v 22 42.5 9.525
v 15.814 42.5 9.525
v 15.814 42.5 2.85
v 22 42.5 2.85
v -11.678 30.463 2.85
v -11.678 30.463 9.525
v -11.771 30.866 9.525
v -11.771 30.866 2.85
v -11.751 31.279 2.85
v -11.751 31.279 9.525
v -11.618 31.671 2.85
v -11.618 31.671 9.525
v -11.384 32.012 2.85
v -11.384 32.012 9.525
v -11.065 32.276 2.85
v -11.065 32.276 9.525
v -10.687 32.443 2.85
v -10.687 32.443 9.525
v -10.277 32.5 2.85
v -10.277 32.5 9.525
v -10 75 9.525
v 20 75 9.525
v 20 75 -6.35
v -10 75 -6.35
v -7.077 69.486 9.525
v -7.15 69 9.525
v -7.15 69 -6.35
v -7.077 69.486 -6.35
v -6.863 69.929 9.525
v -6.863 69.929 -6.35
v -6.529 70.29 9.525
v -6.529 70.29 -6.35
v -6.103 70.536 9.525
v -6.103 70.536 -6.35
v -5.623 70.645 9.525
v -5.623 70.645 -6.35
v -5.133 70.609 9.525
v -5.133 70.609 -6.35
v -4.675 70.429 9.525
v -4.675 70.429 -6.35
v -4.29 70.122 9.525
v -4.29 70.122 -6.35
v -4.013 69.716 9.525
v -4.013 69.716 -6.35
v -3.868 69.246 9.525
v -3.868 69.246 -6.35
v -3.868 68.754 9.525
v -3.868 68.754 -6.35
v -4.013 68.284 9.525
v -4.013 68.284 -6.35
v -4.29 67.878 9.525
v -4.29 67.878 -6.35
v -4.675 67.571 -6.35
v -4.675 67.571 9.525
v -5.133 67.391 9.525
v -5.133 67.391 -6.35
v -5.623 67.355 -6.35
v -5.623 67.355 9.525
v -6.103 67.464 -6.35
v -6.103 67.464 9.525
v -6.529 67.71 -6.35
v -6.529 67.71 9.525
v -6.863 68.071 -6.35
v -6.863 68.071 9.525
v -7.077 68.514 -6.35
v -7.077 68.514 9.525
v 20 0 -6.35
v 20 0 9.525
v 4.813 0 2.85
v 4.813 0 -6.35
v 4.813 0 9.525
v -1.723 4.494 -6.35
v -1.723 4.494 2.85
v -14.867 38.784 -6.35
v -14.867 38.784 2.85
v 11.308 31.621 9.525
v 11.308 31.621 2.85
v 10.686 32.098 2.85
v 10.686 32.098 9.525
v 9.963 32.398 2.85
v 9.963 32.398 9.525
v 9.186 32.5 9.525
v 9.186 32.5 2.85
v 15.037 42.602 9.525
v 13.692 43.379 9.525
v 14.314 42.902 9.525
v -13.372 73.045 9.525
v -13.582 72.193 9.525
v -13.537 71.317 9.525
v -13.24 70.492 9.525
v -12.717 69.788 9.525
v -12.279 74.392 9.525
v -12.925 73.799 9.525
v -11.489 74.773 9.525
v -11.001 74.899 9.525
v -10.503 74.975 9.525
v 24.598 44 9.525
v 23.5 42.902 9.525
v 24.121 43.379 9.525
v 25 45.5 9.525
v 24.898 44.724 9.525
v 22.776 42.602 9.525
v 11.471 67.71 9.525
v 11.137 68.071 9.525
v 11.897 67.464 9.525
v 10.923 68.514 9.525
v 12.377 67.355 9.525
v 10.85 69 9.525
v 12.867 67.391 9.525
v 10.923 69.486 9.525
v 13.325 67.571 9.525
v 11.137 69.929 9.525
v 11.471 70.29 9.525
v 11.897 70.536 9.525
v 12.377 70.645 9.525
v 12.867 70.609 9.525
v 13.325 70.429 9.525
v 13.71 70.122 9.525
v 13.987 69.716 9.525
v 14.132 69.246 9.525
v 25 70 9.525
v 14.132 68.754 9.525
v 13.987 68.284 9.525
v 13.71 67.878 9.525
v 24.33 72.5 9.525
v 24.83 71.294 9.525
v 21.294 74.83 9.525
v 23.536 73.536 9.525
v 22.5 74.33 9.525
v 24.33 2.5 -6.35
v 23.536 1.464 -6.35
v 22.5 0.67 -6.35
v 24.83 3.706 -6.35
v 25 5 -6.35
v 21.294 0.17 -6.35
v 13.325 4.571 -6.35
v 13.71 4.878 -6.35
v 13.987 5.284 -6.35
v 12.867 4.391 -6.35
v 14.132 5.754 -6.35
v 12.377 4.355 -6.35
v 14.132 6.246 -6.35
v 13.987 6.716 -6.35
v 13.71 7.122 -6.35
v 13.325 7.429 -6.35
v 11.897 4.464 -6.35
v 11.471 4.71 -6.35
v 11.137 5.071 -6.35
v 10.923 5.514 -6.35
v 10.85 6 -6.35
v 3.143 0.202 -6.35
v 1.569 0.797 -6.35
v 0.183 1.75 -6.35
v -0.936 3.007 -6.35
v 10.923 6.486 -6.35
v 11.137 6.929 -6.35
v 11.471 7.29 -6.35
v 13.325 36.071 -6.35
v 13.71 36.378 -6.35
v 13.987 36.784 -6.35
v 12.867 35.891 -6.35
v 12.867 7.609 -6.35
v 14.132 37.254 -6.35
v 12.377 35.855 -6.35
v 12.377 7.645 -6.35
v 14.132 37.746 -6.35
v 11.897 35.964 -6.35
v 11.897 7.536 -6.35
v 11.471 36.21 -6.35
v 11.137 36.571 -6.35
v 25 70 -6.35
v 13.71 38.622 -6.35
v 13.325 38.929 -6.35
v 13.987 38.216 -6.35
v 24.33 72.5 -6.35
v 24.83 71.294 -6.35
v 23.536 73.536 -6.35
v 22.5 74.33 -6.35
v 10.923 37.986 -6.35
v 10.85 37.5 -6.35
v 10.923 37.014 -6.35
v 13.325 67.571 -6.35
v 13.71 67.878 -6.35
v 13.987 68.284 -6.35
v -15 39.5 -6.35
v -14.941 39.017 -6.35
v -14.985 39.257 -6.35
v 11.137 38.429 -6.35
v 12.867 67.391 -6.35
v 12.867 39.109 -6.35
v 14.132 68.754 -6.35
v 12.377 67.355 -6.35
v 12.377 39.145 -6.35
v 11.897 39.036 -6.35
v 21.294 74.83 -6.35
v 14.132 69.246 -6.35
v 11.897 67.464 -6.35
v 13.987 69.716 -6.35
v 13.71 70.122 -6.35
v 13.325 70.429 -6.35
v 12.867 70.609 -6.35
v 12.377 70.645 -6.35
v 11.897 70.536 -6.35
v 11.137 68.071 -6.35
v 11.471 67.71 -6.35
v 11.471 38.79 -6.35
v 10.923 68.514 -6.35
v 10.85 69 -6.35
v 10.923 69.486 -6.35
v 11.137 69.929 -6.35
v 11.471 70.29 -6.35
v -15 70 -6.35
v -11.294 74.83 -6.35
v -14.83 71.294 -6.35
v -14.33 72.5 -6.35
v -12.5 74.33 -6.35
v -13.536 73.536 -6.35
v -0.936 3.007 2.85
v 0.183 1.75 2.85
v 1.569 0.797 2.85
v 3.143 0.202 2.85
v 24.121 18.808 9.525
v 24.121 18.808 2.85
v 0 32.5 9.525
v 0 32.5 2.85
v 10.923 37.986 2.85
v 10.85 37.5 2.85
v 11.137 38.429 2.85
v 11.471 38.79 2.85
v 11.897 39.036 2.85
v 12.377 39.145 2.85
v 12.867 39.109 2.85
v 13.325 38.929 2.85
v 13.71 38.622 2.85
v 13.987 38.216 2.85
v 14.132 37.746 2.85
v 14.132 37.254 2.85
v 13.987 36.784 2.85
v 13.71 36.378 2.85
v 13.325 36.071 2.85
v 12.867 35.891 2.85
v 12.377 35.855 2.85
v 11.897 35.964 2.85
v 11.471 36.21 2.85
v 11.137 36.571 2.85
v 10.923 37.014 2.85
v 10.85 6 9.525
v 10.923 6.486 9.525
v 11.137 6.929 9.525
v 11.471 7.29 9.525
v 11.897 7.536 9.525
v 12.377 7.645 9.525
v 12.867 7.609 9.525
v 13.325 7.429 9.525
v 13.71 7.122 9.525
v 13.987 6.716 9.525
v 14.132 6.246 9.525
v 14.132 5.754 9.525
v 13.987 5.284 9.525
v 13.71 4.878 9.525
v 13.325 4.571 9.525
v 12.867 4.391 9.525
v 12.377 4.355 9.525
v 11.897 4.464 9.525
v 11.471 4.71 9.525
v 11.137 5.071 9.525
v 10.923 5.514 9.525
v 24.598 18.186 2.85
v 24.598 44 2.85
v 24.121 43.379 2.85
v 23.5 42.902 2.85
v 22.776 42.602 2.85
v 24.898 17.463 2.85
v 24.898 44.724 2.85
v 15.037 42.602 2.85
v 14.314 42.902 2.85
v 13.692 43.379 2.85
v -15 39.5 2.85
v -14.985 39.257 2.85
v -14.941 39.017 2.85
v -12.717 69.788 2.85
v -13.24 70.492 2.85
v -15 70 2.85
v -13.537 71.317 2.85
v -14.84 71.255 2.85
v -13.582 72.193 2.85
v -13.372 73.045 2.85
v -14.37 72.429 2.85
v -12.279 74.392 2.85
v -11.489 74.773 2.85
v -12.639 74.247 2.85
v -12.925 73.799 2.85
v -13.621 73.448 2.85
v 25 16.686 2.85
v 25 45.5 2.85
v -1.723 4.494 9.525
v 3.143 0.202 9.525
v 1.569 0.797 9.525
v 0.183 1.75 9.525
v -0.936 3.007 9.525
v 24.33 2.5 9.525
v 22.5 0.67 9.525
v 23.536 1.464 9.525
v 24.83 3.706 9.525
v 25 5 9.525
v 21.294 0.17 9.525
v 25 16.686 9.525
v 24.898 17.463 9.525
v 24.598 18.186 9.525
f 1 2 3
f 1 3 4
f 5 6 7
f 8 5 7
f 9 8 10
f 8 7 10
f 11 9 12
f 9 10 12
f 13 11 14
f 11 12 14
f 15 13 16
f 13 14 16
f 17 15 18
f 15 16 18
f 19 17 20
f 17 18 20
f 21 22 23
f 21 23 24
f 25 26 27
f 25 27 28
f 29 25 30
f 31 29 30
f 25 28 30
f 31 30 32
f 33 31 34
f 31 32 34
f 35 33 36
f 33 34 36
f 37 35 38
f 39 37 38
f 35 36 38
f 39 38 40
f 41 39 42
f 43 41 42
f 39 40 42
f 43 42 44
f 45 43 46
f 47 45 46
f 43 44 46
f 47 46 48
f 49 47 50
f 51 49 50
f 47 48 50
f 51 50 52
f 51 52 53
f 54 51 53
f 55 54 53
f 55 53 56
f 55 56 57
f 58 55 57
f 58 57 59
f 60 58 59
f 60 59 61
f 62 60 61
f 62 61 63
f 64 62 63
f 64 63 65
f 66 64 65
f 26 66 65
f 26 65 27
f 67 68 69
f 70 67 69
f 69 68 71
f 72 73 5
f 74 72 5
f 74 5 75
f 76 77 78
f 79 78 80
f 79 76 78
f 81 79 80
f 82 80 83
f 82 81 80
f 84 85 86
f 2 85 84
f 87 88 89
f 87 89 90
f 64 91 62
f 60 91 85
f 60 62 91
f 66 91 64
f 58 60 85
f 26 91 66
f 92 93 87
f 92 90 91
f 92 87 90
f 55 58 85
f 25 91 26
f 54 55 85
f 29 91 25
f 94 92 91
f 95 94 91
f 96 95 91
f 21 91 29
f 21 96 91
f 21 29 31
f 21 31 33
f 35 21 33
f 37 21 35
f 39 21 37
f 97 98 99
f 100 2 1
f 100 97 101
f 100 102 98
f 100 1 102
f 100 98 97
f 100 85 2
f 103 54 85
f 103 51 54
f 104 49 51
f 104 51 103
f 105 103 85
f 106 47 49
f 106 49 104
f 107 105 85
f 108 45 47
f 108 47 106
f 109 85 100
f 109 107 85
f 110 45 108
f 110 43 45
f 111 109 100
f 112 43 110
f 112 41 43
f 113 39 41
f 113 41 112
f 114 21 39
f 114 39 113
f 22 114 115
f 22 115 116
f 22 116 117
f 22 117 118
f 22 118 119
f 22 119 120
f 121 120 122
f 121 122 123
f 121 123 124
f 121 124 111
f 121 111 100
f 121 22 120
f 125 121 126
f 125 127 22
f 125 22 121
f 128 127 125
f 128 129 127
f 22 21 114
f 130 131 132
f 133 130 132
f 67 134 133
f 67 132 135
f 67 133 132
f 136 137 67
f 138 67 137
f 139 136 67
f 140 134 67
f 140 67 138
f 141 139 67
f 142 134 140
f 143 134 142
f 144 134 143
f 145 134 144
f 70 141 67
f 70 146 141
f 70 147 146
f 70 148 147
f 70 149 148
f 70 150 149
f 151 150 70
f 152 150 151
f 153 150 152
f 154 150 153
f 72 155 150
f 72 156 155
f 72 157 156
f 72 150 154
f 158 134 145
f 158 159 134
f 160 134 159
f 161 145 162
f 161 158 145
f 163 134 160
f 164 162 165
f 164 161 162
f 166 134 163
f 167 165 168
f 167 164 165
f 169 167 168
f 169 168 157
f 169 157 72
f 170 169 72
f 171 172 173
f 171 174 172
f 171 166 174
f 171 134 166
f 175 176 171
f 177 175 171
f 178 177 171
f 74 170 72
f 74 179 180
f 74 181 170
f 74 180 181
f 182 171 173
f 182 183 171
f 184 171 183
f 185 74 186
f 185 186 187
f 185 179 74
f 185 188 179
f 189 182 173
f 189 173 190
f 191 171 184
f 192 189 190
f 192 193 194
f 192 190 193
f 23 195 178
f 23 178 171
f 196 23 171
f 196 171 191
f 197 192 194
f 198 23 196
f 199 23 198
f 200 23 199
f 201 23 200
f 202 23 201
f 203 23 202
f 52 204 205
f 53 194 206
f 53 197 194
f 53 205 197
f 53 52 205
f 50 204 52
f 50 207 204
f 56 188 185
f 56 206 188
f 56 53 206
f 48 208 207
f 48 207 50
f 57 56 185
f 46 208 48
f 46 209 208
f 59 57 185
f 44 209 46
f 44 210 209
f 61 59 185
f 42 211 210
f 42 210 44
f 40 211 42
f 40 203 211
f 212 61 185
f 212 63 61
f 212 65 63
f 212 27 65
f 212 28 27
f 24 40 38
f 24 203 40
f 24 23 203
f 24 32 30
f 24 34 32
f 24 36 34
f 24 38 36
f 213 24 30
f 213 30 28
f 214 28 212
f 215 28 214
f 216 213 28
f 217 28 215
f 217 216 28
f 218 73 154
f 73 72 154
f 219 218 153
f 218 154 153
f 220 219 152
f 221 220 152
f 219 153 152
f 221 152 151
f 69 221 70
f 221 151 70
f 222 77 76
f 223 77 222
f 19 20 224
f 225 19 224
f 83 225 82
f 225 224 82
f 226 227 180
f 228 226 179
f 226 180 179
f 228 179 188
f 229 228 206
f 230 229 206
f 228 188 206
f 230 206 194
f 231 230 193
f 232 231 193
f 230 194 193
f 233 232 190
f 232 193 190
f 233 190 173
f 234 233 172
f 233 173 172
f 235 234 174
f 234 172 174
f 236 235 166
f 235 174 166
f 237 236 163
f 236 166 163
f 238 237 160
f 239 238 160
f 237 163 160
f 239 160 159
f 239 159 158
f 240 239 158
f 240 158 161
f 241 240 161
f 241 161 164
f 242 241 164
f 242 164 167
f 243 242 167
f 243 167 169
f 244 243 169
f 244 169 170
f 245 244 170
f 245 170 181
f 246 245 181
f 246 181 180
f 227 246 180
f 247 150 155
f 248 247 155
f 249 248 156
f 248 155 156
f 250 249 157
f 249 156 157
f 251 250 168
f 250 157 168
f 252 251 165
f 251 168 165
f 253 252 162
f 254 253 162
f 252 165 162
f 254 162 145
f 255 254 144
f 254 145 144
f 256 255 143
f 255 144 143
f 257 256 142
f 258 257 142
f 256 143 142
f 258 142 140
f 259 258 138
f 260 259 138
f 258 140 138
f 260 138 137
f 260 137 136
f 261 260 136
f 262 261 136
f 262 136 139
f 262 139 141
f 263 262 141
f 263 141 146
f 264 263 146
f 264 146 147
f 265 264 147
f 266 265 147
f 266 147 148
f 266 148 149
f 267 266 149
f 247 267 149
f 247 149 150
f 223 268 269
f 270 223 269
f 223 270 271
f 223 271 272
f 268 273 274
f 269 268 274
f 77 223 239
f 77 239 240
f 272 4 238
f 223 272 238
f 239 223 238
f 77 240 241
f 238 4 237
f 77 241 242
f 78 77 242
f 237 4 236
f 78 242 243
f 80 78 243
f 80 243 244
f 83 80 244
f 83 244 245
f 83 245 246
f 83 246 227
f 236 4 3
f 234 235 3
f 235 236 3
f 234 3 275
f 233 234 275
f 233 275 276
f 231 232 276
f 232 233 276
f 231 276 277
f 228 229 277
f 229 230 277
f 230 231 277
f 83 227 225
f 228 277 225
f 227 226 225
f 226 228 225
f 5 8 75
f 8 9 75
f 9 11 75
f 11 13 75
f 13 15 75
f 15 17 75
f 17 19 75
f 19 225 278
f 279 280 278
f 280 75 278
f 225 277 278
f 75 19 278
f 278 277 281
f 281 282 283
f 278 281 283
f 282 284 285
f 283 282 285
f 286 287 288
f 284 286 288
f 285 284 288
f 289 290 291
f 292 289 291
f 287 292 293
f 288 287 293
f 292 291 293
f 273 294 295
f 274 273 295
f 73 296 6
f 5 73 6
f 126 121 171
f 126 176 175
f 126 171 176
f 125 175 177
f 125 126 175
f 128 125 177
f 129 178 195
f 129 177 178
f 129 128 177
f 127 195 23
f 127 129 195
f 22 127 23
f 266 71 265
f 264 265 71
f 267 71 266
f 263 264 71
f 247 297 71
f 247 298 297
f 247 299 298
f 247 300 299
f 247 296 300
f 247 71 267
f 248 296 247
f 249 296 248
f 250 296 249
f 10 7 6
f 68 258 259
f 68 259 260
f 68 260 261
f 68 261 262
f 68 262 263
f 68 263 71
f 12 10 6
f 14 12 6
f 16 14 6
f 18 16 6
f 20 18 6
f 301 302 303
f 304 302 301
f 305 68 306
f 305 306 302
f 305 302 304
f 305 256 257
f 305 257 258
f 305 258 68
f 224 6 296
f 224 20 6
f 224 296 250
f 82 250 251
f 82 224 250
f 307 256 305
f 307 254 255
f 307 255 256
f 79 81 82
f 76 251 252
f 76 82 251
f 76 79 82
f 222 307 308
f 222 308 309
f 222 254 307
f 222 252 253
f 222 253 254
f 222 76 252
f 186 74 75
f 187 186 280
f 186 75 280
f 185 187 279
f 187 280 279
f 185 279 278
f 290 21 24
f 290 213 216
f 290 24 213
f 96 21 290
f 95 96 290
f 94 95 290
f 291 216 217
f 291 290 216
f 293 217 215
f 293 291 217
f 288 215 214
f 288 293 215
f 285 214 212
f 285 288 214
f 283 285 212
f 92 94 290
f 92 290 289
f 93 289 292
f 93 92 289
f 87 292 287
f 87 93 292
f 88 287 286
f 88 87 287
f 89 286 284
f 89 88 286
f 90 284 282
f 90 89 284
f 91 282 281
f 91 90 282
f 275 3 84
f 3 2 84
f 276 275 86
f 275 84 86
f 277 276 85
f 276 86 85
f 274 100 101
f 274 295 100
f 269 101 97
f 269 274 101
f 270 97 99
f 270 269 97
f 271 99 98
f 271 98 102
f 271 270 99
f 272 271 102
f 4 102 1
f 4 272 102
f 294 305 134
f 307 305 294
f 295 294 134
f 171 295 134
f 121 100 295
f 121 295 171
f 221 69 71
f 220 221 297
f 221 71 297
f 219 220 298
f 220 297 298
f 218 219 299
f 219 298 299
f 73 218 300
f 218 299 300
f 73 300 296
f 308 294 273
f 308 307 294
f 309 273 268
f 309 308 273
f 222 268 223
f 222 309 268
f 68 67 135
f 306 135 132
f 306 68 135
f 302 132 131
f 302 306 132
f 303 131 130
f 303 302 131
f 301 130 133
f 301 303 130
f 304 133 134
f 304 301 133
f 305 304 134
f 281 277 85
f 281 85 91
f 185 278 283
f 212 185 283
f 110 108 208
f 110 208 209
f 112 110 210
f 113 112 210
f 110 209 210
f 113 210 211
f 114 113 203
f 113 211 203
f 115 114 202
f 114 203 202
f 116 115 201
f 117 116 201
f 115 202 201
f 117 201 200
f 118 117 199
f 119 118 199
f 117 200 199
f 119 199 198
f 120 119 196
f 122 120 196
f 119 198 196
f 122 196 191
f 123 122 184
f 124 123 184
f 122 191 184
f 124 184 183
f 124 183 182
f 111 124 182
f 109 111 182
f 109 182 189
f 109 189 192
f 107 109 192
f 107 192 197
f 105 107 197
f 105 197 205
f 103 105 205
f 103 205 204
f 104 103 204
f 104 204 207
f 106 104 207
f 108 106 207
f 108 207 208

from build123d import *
from build123d.topology import SkipClean

# Parameters (mm, degrees)
SKETCH1_R           = 1.5
SKETCH1_W           = 15
SKETCH1_H           = 37.5
BOSS_EXTRUDE1_DEPTH = 2.85
FILLET1_R           = 5
FILLET2_R           = 2
BOSS_EXTRUDE2_START = 3.5
SKETCH5_R           = 1.5
BOSS_EXTRUDE2_DEPTH = 3.5
FILLET3_R           = 3.5
FILLET4_R           = 2
FILLET5_R           = 2
SKETCH6_R           = 1.5
CUT_EXTRUDE1_DEPTH  = 10
SKETCH8_R           = 1.5
BOSS_EXTRUDE3_DEPTH = 6.35
BOSS_EXTRUDE4_START = 3.175
SKETCH9_R           = 1.5
BOSS_EXTRUDE4_DEPTH = 3.175
SKETCH10_W          = 40
SKETCH10_H          = 15.399494937
SKETCH10_W_2        = 25
BOSS_EXTRUDE5_DEPTH = 6.675
CUT_EXTRUDE2_START  = -6.675
CUT_EXTRUDE2_DEPTH  = 6.675
BOSS_EXTRUDE6_START = -9.2
BOSS_EXTRUDE6_DEPTH = 9.2
FILLET6_R           = 7
BOSS_EXTRUDE7_DEPTH = 6.675
FILLET7_R           = 3
FILLET8_R           = 1.5
SKETCH15_R          = 1.65
CUT_EXTRUDE3_DEPTH  = 81.63507689


# Read off the part's stored shape, not the designer's step: Cut-Extrude2
with BuildPart() as part:
    # Sketch1 → Boss-Extrude1 (new body)
    # profile 1 of 2: a face of its own
    with BuildSketch(Plane.XY):
        Polygon((0, 37.5), (0, 0), (25, 0), (25, 75), (0, 75), align=None)
        with Locations((12.5, 6)):
            Circle(SKETCH1_R, mode=Mode.SUBTRACT)
        with Locations((12.5, 37.5)):
            Circle(SKETCH1_R, mode=Mode.SUBTRACT)
        with Locations((12.5, 69)):
            Circle(SKETCH1_R, mode=Mode.SUBTRACT)
    # profile 2 of 2: a face of its own
    with BuildSketch(Plane.XY):
        with Locations((-7.5, 56.25)):
            Rectangle(SKETCH1_W, SKETCH1_H)
    extrude(amount=BOSS_EXTRUDE1_DEPTH)

    # Fillet1
    fillet1_edges = [part.edges().sort_by_distance(p)[0] for p in [
        (25, 75, 1.425),
        (25, 0, 1.425),
        (0, 0, 1.425),
        (0, 37.5, 1.425),
        (-15, 75, 1.425),
    ]]
    fillet(fillet1_edges, radius=FILLET1_R)

    # Fillet2
    fillet2_edges = [part.edges().sort_by_distance(p)[0] for p in [
        (-15, 37.5, 1.425),
    ]]
    fillet(fillet2_edges, radius=FILLET2_R)

    # Sketch5 → Boss-Extrude2 (add)
    # profile 1 of 2: a face of its own
    with BuildSketch(Plane.XY.offset(2.85).offset(BOSS_EXTRUDE2_START)):
        with BuildLine():
            Line((-15, 42.5), (10.428932188, 42.5))
            Line((10.428932188, 42.5), (21.464466094, 53.535533906))
            Line((21.464466094, 53.535533906), (25, 57.071067812))
            Line((25, 57.071067812), (25, 70))
            ThreePointArc((25, 70), (23.535533906, 73.535533906), (20, 75))
            Line((20, 75), (-10, 75))
            ThreePointArc((-10, 75), (-13.535533906, 73.535533906), (-15, 70))
            Line((-15, 70), (-15, 42.5))
        make_face()
        with Locations((12.5, 69)):
            Circle(SKETCH5_R, mode=Mode.SUBTRACT)
    # profile 2 of 2: a face of its own
    with BuildSketch(Plane.XY.offset(2.85).offset(BOSS_EXTRUDE2_START)):
        with BuildLine():
            Line((14.571067812, 32.5), (0, 17.928932188))
            Line((0, 17.928932188), (0, 5))
            ThreePointArc((0, 5), (1.464466094, 1.464466094), (5, 0))
            Line((5, 0), (20, 0))
            ThreePointArc((20, 0), (23.535533906, 1.464466094), (25, 5))
            Line((25, 5), (25, 32.5))
            Line((25, 32.5), (14.571067812, 32.5))
        make_face()
        with Locations((12.5, 6)):
            Circle(SKETCH5_R, mode=Mode.SUBTRACT)
    extrude(amount=-BOSS_EXTRUDE2_DEPTH)

    # Fillet3
    fillet3_edges = [part.edges().sort_by_distance(p)[0] for p in [
        (10.428932188, 42.5, 4.6),
        (14.571067812, 32.5, 4.6),
    ]]
    fillet(fillet3_edges, radius=FILLET3_R)

    # Fillet4
    fillet4_edges = [part.edges().sort_by_distance(p)[0] for p in [
        (-15, 42.5, 4.6),
    ]]
    fillet(fillet4_edges, radius=FILLET4_R)

    # Fillet5
    fillet5_edges = [part.edges().sort_by_distance(p)[0] for p in [
        (25, 57.071067812, 4.6),
        (25, 32.5, 4.6),
        (0, 17.928932188, 4.6),
    ]]
    fillet(fillet5_edges, radius=FILLET5_R)

    # Sketch6 → Cut-Extrude1 (cut)
    with BuildSketch(Plane.XY.offset(6.35)):
        with Locations((-5.5, 69)):
            Circle(SKETCH6_R)
    extrude(amount=-CUT_EXTRUDE1_DEPTH, mode=Mode.SUBTRACT)

    # Sketch8 → Boss-Extrude3 (add)
    with SkipClean():  # the faces are left unmerged after this step: merging them gives an invalid solid
        with BuildSketch(Plane(origin=(0, 0, 0), x_dir=(-1, 0, 0), z_dir=(0, 0, -1))):
            with BuildLine():
                ThreePointArc((0, 32.5), (1.464466094, 36.035533906), (5, 37.5))
                Line((5, 37.5), (13, 37.5))
                ThreePointArc((13, 37.5), (14.414213562, 38.085786438), (15, 39.5))
                Line((15, 39.5), (15, 70))
                ThreePointArc((15, 70), (13.535533906, 73.535533906), (10, 75))
                Line((10, 75), (-20, 75))
                ThreePointArc((-20, 75), (-23.535533906, 73.535533906), (-25, 70))
                Line((-25, 70), (-25, 5))
                ThreePointArc((-25, 5), (-23.535533906, 1.464466094), (-20, 0))
                Line((-20, 0), (-5, 0))
                ThreePointArc((-5, 0), (-1.464466094, 1.464466094), (0, 5))
                Line((0, 5), (0, 32.5))
            make_face()
            with Locations((-12.5, 6)):
                Circle(SKETCH8_R, mode=Mode.SUBTRACT)
            with Locations((-12.5, 69)):
                Circle(SKETCH8_R, mode=Mode.SUBTRACT)
            with Locations((-12.5, 37.5)):
                Circle(SKETCH8_R, mode=Mode.SUBTRACT)
            with Locations(Location((5.5, 69, 0), (0, 0, 180))):
                Circle(SKETCH8_R, mode=Mode.SUBTRACT)
        extrude(amount=BOSS_EXTRUDE3_DEPTH)
    add(part.part.scale(1), mode=Mode.REPLACE)  # the faces are merged on a copy

    # Sketch9 → Boss-Extrude4 (add)
    # profile 1 of 2: a face of its own
    with BuildSketch(Plane.XY.offset(6.35).offset(BOSS_EXTRUDE4_START)):
        with BuildLine():
            ThreePointArc((16.02081528, 32.5), (14.681423267, 32.233578364), (13.545941546, 31.474873734))
            Line((13.545941546, 31.474873734), (0.585786438, 18.514718626))
            ThreePointArc((0.585786438, 18.514718626), (0.152240935, 17.865871928), (0, 17.100505063))
            Line((0, 17.100505063), (0, 5))
            ThreePointArc((0, 5), (1.464466094, 1.464466094), (5, 0))
            Line((5, 0), (20, 0))
            ThreePointArc((20, 0), (23.535533906, 1.464466094), (25, 5))
            Line((25, 5), (25, 30.5))
            ThreePointArc((25, 30.5), (24.414213562, 31.914213562), (23, 32.5))
            Line((23, 32.5), (16.02081528, 32.5))
        make_face()
    # profile 2 of 2: a face of its own
    with BuildSketch(Plane.XY.offset(6.35).offset(BOSS_EXTRUDE4_START)):
        with BuildLine():
            ThreePointArc((8.97918472, 42.5), (10.318576733, 42.766421636), (11.454058454, 43.525126266))
            Line((11.454058454, 43.525126266), (24.414213562, 56.485281374))
            ThreePointArc((24.414213562, 56.485281374), (24.847759065, 57.134128072), (25, 57.899494937))
            Line((25, 57.899494937), (25, 70))
            ThreePointArc((25, 70), (23.535533906, 73.535533906), (20, 75))
            Line((20, 75), (-10, 75))
            ThreePointArc((-10, 75), (-13.535533906, 73.535533906), (-15, 70))
            Line((-15, 70), (-15, 44.5))
            ThreePointArc((-15, 44.5), (-14.414213562, 43.085786438), (-13, 42.5))
            Line((-13, 42.5), (8.97918472, 42.5))
        make_face()
        with Locations((-5.5, 69)):
            Circle(SKETCH9_R, mode=Mode.SUBTRACT)
        with Locations((12.5, 69)):
            Circle(SKETCH9_R, mode=Mode.SUBTRACT)
    extrude(amount=-BOSS_EXTRUDE4_DEPTH)

    # Sketch10 → Boss-Extrude5 (add)
    with SkipClean():  # the faces are left unmerged after this step: merging them gives an invalid solid
        with BuildSketch(Plane.XY.offset(9.525)):
            with Locations((5, 50.199747469)):
                Rectangle(SKETCH10_W, SKETCH10_H)
            with Locations((12.5, 24.800252531)):
                Rectangle(SKETCH10_W_2, SKETCH10_H)
        extrude(amount=-BOSS_EXTRUDE5_DEPTH)

    # Cut-Extrude2 outline → Cut-Extrude2 (cut)
    with SkipClean():  # the faces are left unmerged after this step: merging them gives an invalid solid
        with BuildSketch(Plane.XY.offset(9.525).offset(CUT_EXTRUDE2_START)):
            Polygon((25, 32.5), (10.428932188, 32.5), (25, 17.928932188), align=None)
            with BuildLine():
                Line((-15, 42.5), (14.571067812, 42.5))
                Line((14.571067812, 42.5), (-14.682437359, 71.75350517))
                ThreePointArc((-14.682437359, 71.75350517), (-14.919968841, 70.891014367), (-15, 70))
                Line((-15, 70), (-15, 42.5))
            make_face()
        extrude(amount=CUT_EXTRUDE2_DEPTH, mode=Mode.SUBTRACT)

    # Sketch12 → Boss-Extrude6 (add)
    with BuildSketch(Plane(origin=(0, 0, -6.35), x_dir=(-1, 0, 0), z_dir=(0, 0, -1)).offset(BOSS_EXTRUDE6_START)):
        with BuildLine():
            Line((0, 0), (14.867488321, 38.784117768))
            ThreePointArc((14.867488321, 38.784117768), (14.133189202, 37.852006604), (13, 37.5))
            Line((13, 37.5), (5, 37.5))
            ThreePointArc((5, 37.5), (1.464466094, 36.035533906), (0, 32.5))
            Line((0, 32.5), (0, 5))
            ThreePointArc((0, 5), (-1.464466094, 1.464466094), (-5, 0))
            Line((-5, 0), (0, 0))
        make_face()
    extrude(amount=BOSS_EXTRUDE6_DEPTH)

    # Fillet6
    fillet6_edges = [part.edges().sort_by_distance(p)[0] for p in [
        (0, 0, -1.75),
    ]]
    fillet(fillet6_edges, radius=FILLET6_R)

    # Sketch13 → Boss-Extrude7 (add)
    with SkipClean():  # the faces are left unmerged after this step: merging them gives an invalid solid
        with BuildSketch(Plane.XY.offset(9.525)):
            with BuildLine():
                Line((0, 32.5), (0, 5))
                ThreePointArc((0, 5), (1.464466094, 1.464466094), (5, 0))
                Line((5, 0), (4.813322939, 0))
                ThreePointArc((4.813322939, 0), (0.847160732, 1.232023115), (-1.722886185, 4.494412187))
                Line((-1.722886185, 4.494412187), (-12.458537109, 32.5))
                Line((-12.458537109, 32.5), (0, 32.5))
            make_face()
        extrude(amount=-BOSS_EXTRUDE7_DEPTH)

    # Fillet7
    fillet7_edges = [part.edges().sort_by_distance(p)[0] for p in [
        (25, 42.5, 6.1875),
        (14.571067812, 42.5, 6.1875),
        (-14.682437359, 71.75350517, 4.6),
        (10.428932188, 32.5, 6.1875),
        (25, 17.928932188, 6.1875),
    ]]
    fillet(fillet7_edges, radius=FILLET7_R)

    # Fillet8
    # the kernel refuses this fillet: 1.5 mm, written as the material it takes off along each edge
    with BuildSketch(Plane(origin=(-12.458537109, 32.5, 14.978612885), x_dir=(0.35794111613384066, -0.9337441605605148, 0), z_dir=(0, 0, -1))) as fillet8_piece_1:
        with BuildLine():
            CenterArc((FILLET8_R * 1.45429676938, -FILLET8_R), FILLET8_R, 90, 110.97380664)
            Line((FILLET8_R * 0.520552608823, -FILLET8_R * 1.35794111613), (0, 0))
            Line((0, 0), (FILLET8_R * 1.45429676938, 0))
        make_face()
    extrude(amount=12.128612885, mode=Mode.SUBTRACT)

    # Sketch15 → Cut-Extrude3 (cut, through all)
    with BuildSketch(Plane(origin=(0, 0, -6.35), x_dir=(-1, 0, 0), z_dir=(0, 0, -1))):
        with Locations((-12.5, 69)):
            Circle(SKETCH15_R)
        with Locations((-12.5, 37.5)):
            Circle(SKETCH15_R)
        with Locations((-12.5, 6)):
            Circle(SKETCH15_R)
        with Locations((5.5, 69)):
            Circle(SKETCH15_R)
    extrude(amount=-CUT_EXTRUDE3_DEPTH, mode=Mode.SUBTRACT)


solid = part.part
